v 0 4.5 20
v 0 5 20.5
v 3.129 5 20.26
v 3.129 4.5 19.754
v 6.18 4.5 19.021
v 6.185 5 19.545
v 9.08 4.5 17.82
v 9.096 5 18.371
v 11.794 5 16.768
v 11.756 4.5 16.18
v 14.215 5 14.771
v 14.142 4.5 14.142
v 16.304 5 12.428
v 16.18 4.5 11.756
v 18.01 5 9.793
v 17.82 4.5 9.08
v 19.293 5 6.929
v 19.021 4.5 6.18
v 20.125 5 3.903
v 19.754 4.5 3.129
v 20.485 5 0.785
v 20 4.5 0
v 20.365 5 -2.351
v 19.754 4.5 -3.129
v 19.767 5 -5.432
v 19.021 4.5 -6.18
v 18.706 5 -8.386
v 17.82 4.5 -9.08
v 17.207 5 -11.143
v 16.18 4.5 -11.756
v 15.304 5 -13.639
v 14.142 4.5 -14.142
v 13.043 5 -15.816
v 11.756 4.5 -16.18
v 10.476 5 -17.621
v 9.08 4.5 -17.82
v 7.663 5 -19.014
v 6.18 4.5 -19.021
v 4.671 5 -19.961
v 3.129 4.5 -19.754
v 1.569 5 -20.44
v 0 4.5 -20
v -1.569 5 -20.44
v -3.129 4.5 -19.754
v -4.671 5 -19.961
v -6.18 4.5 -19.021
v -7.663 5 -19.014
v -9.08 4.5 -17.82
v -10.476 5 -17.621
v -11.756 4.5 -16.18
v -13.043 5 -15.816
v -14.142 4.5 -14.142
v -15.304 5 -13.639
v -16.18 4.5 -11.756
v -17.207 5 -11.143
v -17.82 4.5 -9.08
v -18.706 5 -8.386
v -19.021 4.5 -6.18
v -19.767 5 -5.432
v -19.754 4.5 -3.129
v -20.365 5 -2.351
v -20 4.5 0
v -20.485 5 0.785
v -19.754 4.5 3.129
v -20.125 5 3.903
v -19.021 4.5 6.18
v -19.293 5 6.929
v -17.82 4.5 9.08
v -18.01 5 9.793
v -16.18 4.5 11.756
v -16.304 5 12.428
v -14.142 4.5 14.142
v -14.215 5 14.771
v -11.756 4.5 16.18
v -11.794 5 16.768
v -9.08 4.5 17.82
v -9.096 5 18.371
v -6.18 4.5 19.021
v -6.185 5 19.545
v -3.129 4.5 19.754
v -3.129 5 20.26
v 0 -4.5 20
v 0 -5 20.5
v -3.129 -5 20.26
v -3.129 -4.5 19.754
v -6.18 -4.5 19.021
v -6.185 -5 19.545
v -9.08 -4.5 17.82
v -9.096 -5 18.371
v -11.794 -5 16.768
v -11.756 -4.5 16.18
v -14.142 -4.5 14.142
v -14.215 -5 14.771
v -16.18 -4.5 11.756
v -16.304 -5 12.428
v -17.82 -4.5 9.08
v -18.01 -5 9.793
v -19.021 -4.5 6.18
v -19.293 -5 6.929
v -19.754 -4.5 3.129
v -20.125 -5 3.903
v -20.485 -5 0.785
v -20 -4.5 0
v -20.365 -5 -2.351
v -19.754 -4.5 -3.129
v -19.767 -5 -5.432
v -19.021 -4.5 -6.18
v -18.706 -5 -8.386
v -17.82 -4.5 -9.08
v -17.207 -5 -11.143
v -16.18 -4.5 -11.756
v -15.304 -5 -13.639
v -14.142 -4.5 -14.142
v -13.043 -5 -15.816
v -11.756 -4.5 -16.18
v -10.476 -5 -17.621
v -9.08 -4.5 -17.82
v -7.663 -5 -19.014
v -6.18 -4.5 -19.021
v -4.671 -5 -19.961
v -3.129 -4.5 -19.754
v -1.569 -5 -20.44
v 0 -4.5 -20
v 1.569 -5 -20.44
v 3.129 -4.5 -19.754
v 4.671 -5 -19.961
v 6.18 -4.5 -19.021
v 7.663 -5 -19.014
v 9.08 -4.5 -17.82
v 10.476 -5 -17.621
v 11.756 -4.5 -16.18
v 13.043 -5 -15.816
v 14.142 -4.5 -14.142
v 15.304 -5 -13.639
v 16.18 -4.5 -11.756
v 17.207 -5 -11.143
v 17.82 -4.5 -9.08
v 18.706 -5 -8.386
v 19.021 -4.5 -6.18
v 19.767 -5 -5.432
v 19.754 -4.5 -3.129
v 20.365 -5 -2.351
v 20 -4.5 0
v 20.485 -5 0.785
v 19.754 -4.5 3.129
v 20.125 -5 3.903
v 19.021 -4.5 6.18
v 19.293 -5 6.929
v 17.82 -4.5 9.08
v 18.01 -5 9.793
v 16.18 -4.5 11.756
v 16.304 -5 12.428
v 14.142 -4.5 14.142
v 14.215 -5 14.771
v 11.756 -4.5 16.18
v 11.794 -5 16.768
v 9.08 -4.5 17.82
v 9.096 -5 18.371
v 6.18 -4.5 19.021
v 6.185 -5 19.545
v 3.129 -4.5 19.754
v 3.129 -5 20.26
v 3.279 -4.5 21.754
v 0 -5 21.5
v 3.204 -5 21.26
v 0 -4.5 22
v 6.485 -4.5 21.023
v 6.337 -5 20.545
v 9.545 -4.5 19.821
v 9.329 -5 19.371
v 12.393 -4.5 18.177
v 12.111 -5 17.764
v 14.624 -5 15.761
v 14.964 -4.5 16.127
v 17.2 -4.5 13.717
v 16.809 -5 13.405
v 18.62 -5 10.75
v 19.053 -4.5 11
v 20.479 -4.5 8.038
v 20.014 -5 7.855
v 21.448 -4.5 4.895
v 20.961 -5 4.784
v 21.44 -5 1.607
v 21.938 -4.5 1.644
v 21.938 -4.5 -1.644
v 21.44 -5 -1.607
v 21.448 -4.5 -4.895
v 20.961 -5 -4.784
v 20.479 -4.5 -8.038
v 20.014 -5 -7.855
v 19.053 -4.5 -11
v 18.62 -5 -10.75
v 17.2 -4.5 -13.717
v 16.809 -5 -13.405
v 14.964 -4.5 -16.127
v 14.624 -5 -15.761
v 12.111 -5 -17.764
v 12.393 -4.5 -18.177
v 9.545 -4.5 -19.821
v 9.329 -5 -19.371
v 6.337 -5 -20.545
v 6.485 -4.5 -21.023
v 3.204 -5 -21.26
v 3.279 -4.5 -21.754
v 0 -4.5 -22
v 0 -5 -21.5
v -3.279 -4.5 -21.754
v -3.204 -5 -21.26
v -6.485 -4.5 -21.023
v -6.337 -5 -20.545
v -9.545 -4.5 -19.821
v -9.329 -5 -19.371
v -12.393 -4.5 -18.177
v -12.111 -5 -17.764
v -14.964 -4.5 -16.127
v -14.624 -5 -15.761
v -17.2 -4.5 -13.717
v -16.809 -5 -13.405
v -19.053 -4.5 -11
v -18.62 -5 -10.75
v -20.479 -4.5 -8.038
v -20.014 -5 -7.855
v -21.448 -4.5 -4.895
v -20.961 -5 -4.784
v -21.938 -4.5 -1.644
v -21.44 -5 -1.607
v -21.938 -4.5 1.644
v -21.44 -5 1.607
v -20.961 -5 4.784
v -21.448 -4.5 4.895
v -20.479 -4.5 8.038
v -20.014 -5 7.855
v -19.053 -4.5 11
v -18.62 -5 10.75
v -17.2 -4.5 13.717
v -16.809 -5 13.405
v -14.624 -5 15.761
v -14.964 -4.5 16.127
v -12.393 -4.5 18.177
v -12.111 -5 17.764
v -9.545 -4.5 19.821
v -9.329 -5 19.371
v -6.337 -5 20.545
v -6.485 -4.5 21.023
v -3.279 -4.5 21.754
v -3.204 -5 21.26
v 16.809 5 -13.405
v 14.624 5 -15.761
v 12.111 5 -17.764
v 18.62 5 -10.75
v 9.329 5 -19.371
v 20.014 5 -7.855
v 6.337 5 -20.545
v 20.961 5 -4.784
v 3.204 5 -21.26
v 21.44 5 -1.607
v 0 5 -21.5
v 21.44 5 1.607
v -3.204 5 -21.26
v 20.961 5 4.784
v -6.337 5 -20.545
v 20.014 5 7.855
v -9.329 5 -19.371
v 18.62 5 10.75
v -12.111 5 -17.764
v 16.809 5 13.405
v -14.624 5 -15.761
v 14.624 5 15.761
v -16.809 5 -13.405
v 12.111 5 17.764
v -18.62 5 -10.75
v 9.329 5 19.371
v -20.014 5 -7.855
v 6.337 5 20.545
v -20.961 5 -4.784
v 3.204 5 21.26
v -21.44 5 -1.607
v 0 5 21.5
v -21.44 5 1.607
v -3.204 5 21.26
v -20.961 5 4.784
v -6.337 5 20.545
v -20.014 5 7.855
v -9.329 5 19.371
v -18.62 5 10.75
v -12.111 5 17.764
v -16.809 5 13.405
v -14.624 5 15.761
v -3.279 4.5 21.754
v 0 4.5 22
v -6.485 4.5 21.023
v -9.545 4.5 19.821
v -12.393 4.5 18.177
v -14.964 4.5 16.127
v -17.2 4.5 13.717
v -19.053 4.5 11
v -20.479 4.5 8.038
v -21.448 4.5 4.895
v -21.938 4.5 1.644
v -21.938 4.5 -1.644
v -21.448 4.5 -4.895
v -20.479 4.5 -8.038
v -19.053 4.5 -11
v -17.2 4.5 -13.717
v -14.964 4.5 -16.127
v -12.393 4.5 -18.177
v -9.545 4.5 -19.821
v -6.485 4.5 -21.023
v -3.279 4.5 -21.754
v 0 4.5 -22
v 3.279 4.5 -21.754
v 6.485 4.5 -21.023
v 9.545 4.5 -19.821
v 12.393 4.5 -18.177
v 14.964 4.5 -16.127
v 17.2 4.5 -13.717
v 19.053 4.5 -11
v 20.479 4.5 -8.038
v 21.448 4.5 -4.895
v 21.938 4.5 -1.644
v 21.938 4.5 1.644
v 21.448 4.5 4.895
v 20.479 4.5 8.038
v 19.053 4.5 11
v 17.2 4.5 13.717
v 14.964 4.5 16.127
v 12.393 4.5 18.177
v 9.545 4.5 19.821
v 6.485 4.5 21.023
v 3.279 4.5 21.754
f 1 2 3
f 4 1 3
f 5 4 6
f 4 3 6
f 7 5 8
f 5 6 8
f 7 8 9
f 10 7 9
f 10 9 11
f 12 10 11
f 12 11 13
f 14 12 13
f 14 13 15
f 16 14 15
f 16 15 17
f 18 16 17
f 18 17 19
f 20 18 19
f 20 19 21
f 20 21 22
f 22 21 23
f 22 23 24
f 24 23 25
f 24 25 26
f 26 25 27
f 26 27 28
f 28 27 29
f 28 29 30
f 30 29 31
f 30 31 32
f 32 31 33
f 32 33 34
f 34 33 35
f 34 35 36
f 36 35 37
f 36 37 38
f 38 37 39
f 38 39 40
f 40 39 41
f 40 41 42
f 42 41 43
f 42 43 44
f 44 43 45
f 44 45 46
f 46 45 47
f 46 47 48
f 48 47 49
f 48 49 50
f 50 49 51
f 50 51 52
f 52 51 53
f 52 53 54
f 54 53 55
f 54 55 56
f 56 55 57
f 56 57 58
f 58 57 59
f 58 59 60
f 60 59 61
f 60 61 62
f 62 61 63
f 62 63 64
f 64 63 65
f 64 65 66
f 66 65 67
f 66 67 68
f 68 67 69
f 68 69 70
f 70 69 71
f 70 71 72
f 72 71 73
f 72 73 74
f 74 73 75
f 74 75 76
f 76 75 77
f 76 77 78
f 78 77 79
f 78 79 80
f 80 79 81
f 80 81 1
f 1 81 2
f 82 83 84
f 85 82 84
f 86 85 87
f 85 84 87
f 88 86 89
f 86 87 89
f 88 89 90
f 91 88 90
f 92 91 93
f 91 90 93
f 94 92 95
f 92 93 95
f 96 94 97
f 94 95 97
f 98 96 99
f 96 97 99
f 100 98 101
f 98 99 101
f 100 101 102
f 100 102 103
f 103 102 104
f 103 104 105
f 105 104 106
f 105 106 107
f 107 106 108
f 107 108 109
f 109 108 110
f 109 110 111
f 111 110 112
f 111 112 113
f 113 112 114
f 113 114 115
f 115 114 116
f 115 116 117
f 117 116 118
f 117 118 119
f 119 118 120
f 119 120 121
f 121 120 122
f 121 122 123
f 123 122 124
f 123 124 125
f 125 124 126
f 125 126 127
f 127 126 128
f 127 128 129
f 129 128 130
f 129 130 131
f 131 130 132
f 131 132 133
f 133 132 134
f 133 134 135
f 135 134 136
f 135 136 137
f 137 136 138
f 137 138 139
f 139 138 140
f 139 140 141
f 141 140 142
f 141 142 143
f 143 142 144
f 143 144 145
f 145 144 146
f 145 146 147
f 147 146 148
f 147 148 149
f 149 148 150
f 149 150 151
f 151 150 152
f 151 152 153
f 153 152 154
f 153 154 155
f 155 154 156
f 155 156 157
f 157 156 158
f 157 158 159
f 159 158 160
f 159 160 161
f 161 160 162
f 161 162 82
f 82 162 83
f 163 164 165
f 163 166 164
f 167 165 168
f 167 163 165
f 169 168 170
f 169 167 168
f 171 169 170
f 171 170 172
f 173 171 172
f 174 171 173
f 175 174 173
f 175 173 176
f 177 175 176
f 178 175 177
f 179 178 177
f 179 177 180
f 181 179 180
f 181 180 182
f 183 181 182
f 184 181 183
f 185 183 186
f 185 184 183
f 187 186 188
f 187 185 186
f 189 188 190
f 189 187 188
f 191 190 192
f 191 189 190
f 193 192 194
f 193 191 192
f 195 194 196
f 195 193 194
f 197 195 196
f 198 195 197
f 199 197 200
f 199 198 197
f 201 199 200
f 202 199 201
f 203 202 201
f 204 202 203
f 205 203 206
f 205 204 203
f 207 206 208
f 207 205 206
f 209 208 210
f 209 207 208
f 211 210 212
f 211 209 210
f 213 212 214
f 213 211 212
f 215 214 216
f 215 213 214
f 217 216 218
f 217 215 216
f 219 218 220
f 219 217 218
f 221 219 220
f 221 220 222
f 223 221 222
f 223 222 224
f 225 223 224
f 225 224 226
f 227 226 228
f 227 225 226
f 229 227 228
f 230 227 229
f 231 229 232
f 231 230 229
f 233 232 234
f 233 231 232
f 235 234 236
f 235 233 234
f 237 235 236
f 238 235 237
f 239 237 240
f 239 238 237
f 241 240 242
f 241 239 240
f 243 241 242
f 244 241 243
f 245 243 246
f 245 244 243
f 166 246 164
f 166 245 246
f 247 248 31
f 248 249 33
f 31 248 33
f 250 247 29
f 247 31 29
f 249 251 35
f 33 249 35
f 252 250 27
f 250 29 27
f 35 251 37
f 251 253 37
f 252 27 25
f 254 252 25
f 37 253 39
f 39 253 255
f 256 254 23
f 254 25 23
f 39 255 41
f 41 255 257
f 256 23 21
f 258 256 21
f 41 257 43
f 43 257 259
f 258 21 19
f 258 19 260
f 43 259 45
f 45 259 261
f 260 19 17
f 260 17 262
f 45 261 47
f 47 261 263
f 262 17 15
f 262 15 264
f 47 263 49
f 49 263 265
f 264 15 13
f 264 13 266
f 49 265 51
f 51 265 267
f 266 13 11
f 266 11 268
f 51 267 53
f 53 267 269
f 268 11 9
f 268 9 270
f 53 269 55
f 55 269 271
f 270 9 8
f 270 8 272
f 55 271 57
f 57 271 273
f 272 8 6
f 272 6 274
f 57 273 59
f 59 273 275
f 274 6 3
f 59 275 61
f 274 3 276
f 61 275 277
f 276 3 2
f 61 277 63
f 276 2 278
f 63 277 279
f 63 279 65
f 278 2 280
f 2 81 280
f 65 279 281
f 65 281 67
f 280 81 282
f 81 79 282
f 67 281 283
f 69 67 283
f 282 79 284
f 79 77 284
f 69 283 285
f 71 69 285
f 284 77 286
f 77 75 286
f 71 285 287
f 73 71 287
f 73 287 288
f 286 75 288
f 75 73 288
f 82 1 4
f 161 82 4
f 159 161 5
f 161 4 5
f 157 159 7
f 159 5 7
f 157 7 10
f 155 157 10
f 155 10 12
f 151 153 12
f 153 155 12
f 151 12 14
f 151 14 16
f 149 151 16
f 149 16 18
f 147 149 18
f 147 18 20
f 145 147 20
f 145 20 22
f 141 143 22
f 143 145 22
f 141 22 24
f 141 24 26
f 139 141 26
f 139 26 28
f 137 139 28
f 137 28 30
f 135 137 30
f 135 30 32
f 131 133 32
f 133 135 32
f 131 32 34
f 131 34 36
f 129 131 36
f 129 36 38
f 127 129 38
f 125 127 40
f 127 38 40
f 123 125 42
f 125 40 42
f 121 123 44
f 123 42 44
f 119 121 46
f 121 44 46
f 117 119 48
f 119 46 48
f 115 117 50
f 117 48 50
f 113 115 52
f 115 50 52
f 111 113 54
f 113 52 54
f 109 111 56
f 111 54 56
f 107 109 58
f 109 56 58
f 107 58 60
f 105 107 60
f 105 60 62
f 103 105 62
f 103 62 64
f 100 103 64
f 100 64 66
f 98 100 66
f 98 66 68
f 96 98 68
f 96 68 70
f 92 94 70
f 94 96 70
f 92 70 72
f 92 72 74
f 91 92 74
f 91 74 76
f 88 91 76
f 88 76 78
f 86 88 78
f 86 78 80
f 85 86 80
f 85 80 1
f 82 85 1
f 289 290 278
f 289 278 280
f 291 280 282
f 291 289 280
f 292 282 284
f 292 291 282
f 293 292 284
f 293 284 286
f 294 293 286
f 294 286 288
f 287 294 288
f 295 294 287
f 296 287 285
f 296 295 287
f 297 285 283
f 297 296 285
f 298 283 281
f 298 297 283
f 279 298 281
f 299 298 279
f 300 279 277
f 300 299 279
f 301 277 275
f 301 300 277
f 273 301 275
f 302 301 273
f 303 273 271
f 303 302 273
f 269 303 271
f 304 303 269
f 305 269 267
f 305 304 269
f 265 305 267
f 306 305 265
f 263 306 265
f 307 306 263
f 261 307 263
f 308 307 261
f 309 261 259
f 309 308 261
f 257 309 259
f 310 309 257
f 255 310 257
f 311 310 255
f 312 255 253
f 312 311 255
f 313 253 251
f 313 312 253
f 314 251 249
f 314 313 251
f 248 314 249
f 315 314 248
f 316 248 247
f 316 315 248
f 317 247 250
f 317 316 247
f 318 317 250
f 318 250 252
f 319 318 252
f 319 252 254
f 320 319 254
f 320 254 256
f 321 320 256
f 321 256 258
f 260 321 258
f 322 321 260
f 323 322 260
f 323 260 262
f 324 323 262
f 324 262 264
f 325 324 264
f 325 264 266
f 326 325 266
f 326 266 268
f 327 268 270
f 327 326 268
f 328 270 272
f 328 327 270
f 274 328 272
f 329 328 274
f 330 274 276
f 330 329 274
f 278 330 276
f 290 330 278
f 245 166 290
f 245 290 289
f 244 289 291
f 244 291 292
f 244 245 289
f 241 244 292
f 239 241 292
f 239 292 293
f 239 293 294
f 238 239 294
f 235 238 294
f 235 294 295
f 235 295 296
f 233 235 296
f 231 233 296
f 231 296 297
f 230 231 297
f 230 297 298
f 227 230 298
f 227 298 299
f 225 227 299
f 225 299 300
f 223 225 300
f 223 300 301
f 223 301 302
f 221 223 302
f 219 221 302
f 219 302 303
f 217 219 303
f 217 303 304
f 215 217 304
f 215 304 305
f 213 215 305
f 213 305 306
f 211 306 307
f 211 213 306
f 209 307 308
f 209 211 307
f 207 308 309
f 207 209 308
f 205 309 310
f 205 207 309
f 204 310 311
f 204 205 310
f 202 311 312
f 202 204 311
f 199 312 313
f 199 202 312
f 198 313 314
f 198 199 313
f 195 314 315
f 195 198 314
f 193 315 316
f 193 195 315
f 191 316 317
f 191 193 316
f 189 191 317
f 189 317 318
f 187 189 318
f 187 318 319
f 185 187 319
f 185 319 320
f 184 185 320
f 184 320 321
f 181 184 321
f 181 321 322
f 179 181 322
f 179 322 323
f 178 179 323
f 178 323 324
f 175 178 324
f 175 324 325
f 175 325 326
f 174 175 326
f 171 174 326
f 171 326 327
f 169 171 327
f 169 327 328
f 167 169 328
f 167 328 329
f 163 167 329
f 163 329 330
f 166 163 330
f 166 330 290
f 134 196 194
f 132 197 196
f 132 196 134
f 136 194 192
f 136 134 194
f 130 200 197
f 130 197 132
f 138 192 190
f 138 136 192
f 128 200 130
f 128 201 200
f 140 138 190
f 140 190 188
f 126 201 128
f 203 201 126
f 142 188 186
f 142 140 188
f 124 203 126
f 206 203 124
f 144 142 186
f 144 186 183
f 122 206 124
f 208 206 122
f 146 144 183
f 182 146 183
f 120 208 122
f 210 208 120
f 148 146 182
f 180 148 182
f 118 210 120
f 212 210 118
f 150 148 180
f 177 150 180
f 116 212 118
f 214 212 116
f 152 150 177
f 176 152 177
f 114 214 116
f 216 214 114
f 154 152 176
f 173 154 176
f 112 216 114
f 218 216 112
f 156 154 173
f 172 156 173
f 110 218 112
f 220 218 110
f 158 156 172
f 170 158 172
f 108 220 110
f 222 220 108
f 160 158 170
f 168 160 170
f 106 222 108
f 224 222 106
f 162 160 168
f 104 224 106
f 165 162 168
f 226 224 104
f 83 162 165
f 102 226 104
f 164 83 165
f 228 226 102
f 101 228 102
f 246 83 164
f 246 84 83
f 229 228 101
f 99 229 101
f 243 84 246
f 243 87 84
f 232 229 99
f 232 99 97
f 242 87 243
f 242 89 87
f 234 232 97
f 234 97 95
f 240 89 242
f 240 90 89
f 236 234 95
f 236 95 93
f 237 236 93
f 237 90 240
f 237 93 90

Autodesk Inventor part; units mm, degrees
ref_plane "YZ Plane" through (0, 0, 0) normal (1, 0, 0) x (0, 1, 0)
ref_plane "XZ Plane" through (0, 0, 0) normal (0, 1, 0) x (-1, 0, 0)
ref_plane "XY Plane" through (0, 0, 0) normal (0, 0, 1) x (1, 0, 0)
sketch "Skizze1" plane through (0, 0, 0) normal (1, 0, 0) x (0, 1, 0)
  line L0 (5, 22) -> (-5, 22)
  line L1 (-5, 22) -> (-5, 20)
  line L2 (-5, 20) -> (5, 20)
  line L3 (5, 20) -> (5, 22)
  line L4 (5.4713, 0) -> (-6.5925, 0)
  point P0 (0, 0)
  point P1 (0, 20)
  point P2 (0, 22)
  dimension "d0" = 20
  dimension "d1" = 22
  dimension "d2" = 10
  dimension "d3" = 5
revolve "Basebody" add sketch "Skizze1" angle 360 about axis through (0, 5.4713, 0) along (0, -1, 0)
chamfer "Fasen1" distance 0.5 angle 45 4 edges at (0, 5, -20) (0, 5, -22) (0, -5, -22) (0, -5, -20)
properties part number "35-30-xxx Plain Bearing Socket" material "Kunststoff, undurchsichtig Weiß"
